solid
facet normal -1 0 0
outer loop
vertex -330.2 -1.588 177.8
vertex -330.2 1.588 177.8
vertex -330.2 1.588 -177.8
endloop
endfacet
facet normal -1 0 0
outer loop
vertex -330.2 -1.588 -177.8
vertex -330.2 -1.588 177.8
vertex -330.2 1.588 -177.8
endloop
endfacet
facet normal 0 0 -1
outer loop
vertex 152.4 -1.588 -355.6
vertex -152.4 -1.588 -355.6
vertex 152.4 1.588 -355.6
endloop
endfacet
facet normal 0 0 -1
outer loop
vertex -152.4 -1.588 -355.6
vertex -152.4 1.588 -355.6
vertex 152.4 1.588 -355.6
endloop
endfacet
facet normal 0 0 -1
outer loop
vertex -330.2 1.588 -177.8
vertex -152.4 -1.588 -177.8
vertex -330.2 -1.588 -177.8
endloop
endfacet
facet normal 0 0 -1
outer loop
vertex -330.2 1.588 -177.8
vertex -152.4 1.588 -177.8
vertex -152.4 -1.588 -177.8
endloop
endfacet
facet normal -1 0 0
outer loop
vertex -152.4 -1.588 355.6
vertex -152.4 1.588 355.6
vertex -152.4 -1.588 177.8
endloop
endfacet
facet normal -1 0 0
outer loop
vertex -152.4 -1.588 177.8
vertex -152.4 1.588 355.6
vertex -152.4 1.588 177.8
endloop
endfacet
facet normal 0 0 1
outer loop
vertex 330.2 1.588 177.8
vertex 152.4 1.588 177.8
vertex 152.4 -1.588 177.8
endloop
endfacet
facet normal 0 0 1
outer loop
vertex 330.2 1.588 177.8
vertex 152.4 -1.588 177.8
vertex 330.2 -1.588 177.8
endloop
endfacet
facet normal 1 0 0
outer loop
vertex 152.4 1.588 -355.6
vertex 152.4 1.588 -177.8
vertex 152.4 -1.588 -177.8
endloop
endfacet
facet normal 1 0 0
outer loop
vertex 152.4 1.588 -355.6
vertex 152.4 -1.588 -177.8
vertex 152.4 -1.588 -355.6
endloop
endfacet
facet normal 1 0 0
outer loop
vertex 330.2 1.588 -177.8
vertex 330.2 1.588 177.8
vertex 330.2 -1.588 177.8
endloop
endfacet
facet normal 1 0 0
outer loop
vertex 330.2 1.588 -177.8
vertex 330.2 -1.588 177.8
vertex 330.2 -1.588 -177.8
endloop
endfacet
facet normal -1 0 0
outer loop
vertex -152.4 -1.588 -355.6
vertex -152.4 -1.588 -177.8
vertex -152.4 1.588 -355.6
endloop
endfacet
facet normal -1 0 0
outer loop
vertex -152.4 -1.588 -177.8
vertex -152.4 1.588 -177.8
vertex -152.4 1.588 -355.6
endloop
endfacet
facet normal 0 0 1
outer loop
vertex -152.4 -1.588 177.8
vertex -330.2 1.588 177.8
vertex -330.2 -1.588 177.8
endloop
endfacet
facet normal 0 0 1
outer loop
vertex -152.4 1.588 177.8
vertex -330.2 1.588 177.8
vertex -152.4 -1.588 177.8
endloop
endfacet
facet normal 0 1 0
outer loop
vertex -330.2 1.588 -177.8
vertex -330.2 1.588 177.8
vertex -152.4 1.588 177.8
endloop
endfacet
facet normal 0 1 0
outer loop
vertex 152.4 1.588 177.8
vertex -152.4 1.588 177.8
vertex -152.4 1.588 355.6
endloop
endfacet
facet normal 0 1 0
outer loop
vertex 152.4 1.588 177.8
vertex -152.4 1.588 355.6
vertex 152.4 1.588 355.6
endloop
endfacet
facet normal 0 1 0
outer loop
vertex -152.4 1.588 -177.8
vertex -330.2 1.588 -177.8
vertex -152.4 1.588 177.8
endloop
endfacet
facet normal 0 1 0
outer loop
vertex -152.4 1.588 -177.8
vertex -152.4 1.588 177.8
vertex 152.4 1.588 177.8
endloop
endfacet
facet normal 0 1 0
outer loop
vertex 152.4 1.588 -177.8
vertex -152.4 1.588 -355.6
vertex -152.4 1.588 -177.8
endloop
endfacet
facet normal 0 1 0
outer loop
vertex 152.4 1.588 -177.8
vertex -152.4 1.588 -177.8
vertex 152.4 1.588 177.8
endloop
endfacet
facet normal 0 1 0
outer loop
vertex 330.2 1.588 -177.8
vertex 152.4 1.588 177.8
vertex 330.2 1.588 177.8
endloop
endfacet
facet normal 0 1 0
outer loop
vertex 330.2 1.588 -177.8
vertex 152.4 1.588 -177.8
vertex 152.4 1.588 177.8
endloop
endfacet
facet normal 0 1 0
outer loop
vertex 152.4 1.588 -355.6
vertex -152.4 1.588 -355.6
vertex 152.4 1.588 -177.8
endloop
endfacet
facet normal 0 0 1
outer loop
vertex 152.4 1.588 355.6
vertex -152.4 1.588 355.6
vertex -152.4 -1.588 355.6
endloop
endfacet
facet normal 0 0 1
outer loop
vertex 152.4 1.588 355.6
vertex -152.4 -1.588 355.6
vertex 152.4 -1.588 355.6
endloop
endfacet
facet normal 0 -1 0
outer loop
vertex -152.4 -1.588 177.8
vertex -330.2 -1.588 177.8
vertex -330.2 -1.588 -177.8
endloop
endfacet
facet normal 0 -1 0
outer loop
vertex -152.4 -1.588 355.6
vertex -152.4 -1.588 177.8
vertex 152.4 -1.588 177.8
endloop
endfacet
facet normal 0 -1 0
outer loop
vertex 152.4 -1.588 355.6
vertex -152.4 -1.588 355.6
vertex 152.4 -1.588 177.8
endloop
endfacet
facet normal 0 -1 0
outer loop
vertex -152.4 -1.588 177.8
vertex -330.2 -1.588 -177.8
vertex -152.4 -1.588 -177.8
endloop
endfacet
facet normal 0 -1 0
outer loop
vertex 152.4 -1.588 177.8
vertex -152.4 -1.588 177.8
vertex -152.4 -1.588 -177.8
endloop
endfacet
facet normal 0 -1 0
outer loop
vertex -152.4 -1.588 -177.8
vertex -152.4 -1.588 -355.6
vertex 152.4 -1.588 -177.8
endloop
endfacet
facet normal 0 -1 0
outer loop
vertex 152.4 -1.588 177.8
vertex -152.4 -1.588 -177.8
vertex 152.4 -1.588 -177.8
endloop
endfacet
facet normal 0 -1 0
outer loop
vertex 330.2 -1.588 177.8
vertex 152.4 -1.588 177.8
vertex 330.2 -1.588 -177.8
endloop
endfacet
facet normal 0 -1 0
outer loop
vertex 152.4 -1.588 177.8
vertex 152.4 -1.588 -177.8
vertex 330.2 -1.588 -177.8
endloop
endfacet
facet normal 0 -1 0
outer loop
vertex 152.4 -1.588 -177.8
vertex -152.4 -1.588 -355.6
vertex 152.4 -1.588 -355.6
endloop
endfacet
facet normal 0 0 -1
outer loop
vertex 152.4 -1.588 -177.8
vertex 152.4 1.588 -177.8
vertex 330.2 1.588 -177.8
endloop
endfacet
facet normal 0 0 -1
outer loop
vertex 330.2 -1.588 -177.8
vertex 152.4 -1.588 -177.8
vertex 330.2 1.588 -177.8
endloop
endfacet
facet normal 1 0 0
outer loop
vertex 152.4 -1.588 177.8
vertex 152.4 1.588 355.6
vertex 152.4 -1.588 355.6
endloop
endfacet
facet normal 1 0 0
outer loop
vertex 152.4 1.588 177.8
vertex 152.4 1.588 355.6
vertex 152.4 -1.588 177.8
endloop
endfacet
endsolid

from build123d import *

# Parameters (mm, degrees)
SKETCH1_W           = 177.8
SKETCH1_H           = 355.6
SKETCH1_W_2         = 304.8
SKETCH1_H_2         = 177.8
BOSS_EXTRUDE1_DEPTH = 1.5875


with BuildPart() as part:
    # Sketch1 → Boss-Extrude1 (new, symmetric)
    with BuildSketch(Plane(origin=(0, 0, 0), x_dir=(1, 0, 0), z_dir=(0, 1, 0))):
        with Locations((-241.3, 0)):
            Rectangle(SKETCH1_W, SKETCH1_H)
        Rectangle(SKETCH1_W_2, SKETCH1_H)
        with Locations((0, 266.7)):
            Rectangle(SKETCH1_W_2, SKETCH1_H_2)
        with Locations((0, -266.7)):
            Rectangle(SKETCH1_W_2, SKETCH1_H_2)
        with Locations((241.3, 0)):
            Rectangle(SKETCH1_W, SKETCH1_H)
    extrude(amount=BOSS_EXTRUDE1_DEPTH, both=True)


solid = part.part
